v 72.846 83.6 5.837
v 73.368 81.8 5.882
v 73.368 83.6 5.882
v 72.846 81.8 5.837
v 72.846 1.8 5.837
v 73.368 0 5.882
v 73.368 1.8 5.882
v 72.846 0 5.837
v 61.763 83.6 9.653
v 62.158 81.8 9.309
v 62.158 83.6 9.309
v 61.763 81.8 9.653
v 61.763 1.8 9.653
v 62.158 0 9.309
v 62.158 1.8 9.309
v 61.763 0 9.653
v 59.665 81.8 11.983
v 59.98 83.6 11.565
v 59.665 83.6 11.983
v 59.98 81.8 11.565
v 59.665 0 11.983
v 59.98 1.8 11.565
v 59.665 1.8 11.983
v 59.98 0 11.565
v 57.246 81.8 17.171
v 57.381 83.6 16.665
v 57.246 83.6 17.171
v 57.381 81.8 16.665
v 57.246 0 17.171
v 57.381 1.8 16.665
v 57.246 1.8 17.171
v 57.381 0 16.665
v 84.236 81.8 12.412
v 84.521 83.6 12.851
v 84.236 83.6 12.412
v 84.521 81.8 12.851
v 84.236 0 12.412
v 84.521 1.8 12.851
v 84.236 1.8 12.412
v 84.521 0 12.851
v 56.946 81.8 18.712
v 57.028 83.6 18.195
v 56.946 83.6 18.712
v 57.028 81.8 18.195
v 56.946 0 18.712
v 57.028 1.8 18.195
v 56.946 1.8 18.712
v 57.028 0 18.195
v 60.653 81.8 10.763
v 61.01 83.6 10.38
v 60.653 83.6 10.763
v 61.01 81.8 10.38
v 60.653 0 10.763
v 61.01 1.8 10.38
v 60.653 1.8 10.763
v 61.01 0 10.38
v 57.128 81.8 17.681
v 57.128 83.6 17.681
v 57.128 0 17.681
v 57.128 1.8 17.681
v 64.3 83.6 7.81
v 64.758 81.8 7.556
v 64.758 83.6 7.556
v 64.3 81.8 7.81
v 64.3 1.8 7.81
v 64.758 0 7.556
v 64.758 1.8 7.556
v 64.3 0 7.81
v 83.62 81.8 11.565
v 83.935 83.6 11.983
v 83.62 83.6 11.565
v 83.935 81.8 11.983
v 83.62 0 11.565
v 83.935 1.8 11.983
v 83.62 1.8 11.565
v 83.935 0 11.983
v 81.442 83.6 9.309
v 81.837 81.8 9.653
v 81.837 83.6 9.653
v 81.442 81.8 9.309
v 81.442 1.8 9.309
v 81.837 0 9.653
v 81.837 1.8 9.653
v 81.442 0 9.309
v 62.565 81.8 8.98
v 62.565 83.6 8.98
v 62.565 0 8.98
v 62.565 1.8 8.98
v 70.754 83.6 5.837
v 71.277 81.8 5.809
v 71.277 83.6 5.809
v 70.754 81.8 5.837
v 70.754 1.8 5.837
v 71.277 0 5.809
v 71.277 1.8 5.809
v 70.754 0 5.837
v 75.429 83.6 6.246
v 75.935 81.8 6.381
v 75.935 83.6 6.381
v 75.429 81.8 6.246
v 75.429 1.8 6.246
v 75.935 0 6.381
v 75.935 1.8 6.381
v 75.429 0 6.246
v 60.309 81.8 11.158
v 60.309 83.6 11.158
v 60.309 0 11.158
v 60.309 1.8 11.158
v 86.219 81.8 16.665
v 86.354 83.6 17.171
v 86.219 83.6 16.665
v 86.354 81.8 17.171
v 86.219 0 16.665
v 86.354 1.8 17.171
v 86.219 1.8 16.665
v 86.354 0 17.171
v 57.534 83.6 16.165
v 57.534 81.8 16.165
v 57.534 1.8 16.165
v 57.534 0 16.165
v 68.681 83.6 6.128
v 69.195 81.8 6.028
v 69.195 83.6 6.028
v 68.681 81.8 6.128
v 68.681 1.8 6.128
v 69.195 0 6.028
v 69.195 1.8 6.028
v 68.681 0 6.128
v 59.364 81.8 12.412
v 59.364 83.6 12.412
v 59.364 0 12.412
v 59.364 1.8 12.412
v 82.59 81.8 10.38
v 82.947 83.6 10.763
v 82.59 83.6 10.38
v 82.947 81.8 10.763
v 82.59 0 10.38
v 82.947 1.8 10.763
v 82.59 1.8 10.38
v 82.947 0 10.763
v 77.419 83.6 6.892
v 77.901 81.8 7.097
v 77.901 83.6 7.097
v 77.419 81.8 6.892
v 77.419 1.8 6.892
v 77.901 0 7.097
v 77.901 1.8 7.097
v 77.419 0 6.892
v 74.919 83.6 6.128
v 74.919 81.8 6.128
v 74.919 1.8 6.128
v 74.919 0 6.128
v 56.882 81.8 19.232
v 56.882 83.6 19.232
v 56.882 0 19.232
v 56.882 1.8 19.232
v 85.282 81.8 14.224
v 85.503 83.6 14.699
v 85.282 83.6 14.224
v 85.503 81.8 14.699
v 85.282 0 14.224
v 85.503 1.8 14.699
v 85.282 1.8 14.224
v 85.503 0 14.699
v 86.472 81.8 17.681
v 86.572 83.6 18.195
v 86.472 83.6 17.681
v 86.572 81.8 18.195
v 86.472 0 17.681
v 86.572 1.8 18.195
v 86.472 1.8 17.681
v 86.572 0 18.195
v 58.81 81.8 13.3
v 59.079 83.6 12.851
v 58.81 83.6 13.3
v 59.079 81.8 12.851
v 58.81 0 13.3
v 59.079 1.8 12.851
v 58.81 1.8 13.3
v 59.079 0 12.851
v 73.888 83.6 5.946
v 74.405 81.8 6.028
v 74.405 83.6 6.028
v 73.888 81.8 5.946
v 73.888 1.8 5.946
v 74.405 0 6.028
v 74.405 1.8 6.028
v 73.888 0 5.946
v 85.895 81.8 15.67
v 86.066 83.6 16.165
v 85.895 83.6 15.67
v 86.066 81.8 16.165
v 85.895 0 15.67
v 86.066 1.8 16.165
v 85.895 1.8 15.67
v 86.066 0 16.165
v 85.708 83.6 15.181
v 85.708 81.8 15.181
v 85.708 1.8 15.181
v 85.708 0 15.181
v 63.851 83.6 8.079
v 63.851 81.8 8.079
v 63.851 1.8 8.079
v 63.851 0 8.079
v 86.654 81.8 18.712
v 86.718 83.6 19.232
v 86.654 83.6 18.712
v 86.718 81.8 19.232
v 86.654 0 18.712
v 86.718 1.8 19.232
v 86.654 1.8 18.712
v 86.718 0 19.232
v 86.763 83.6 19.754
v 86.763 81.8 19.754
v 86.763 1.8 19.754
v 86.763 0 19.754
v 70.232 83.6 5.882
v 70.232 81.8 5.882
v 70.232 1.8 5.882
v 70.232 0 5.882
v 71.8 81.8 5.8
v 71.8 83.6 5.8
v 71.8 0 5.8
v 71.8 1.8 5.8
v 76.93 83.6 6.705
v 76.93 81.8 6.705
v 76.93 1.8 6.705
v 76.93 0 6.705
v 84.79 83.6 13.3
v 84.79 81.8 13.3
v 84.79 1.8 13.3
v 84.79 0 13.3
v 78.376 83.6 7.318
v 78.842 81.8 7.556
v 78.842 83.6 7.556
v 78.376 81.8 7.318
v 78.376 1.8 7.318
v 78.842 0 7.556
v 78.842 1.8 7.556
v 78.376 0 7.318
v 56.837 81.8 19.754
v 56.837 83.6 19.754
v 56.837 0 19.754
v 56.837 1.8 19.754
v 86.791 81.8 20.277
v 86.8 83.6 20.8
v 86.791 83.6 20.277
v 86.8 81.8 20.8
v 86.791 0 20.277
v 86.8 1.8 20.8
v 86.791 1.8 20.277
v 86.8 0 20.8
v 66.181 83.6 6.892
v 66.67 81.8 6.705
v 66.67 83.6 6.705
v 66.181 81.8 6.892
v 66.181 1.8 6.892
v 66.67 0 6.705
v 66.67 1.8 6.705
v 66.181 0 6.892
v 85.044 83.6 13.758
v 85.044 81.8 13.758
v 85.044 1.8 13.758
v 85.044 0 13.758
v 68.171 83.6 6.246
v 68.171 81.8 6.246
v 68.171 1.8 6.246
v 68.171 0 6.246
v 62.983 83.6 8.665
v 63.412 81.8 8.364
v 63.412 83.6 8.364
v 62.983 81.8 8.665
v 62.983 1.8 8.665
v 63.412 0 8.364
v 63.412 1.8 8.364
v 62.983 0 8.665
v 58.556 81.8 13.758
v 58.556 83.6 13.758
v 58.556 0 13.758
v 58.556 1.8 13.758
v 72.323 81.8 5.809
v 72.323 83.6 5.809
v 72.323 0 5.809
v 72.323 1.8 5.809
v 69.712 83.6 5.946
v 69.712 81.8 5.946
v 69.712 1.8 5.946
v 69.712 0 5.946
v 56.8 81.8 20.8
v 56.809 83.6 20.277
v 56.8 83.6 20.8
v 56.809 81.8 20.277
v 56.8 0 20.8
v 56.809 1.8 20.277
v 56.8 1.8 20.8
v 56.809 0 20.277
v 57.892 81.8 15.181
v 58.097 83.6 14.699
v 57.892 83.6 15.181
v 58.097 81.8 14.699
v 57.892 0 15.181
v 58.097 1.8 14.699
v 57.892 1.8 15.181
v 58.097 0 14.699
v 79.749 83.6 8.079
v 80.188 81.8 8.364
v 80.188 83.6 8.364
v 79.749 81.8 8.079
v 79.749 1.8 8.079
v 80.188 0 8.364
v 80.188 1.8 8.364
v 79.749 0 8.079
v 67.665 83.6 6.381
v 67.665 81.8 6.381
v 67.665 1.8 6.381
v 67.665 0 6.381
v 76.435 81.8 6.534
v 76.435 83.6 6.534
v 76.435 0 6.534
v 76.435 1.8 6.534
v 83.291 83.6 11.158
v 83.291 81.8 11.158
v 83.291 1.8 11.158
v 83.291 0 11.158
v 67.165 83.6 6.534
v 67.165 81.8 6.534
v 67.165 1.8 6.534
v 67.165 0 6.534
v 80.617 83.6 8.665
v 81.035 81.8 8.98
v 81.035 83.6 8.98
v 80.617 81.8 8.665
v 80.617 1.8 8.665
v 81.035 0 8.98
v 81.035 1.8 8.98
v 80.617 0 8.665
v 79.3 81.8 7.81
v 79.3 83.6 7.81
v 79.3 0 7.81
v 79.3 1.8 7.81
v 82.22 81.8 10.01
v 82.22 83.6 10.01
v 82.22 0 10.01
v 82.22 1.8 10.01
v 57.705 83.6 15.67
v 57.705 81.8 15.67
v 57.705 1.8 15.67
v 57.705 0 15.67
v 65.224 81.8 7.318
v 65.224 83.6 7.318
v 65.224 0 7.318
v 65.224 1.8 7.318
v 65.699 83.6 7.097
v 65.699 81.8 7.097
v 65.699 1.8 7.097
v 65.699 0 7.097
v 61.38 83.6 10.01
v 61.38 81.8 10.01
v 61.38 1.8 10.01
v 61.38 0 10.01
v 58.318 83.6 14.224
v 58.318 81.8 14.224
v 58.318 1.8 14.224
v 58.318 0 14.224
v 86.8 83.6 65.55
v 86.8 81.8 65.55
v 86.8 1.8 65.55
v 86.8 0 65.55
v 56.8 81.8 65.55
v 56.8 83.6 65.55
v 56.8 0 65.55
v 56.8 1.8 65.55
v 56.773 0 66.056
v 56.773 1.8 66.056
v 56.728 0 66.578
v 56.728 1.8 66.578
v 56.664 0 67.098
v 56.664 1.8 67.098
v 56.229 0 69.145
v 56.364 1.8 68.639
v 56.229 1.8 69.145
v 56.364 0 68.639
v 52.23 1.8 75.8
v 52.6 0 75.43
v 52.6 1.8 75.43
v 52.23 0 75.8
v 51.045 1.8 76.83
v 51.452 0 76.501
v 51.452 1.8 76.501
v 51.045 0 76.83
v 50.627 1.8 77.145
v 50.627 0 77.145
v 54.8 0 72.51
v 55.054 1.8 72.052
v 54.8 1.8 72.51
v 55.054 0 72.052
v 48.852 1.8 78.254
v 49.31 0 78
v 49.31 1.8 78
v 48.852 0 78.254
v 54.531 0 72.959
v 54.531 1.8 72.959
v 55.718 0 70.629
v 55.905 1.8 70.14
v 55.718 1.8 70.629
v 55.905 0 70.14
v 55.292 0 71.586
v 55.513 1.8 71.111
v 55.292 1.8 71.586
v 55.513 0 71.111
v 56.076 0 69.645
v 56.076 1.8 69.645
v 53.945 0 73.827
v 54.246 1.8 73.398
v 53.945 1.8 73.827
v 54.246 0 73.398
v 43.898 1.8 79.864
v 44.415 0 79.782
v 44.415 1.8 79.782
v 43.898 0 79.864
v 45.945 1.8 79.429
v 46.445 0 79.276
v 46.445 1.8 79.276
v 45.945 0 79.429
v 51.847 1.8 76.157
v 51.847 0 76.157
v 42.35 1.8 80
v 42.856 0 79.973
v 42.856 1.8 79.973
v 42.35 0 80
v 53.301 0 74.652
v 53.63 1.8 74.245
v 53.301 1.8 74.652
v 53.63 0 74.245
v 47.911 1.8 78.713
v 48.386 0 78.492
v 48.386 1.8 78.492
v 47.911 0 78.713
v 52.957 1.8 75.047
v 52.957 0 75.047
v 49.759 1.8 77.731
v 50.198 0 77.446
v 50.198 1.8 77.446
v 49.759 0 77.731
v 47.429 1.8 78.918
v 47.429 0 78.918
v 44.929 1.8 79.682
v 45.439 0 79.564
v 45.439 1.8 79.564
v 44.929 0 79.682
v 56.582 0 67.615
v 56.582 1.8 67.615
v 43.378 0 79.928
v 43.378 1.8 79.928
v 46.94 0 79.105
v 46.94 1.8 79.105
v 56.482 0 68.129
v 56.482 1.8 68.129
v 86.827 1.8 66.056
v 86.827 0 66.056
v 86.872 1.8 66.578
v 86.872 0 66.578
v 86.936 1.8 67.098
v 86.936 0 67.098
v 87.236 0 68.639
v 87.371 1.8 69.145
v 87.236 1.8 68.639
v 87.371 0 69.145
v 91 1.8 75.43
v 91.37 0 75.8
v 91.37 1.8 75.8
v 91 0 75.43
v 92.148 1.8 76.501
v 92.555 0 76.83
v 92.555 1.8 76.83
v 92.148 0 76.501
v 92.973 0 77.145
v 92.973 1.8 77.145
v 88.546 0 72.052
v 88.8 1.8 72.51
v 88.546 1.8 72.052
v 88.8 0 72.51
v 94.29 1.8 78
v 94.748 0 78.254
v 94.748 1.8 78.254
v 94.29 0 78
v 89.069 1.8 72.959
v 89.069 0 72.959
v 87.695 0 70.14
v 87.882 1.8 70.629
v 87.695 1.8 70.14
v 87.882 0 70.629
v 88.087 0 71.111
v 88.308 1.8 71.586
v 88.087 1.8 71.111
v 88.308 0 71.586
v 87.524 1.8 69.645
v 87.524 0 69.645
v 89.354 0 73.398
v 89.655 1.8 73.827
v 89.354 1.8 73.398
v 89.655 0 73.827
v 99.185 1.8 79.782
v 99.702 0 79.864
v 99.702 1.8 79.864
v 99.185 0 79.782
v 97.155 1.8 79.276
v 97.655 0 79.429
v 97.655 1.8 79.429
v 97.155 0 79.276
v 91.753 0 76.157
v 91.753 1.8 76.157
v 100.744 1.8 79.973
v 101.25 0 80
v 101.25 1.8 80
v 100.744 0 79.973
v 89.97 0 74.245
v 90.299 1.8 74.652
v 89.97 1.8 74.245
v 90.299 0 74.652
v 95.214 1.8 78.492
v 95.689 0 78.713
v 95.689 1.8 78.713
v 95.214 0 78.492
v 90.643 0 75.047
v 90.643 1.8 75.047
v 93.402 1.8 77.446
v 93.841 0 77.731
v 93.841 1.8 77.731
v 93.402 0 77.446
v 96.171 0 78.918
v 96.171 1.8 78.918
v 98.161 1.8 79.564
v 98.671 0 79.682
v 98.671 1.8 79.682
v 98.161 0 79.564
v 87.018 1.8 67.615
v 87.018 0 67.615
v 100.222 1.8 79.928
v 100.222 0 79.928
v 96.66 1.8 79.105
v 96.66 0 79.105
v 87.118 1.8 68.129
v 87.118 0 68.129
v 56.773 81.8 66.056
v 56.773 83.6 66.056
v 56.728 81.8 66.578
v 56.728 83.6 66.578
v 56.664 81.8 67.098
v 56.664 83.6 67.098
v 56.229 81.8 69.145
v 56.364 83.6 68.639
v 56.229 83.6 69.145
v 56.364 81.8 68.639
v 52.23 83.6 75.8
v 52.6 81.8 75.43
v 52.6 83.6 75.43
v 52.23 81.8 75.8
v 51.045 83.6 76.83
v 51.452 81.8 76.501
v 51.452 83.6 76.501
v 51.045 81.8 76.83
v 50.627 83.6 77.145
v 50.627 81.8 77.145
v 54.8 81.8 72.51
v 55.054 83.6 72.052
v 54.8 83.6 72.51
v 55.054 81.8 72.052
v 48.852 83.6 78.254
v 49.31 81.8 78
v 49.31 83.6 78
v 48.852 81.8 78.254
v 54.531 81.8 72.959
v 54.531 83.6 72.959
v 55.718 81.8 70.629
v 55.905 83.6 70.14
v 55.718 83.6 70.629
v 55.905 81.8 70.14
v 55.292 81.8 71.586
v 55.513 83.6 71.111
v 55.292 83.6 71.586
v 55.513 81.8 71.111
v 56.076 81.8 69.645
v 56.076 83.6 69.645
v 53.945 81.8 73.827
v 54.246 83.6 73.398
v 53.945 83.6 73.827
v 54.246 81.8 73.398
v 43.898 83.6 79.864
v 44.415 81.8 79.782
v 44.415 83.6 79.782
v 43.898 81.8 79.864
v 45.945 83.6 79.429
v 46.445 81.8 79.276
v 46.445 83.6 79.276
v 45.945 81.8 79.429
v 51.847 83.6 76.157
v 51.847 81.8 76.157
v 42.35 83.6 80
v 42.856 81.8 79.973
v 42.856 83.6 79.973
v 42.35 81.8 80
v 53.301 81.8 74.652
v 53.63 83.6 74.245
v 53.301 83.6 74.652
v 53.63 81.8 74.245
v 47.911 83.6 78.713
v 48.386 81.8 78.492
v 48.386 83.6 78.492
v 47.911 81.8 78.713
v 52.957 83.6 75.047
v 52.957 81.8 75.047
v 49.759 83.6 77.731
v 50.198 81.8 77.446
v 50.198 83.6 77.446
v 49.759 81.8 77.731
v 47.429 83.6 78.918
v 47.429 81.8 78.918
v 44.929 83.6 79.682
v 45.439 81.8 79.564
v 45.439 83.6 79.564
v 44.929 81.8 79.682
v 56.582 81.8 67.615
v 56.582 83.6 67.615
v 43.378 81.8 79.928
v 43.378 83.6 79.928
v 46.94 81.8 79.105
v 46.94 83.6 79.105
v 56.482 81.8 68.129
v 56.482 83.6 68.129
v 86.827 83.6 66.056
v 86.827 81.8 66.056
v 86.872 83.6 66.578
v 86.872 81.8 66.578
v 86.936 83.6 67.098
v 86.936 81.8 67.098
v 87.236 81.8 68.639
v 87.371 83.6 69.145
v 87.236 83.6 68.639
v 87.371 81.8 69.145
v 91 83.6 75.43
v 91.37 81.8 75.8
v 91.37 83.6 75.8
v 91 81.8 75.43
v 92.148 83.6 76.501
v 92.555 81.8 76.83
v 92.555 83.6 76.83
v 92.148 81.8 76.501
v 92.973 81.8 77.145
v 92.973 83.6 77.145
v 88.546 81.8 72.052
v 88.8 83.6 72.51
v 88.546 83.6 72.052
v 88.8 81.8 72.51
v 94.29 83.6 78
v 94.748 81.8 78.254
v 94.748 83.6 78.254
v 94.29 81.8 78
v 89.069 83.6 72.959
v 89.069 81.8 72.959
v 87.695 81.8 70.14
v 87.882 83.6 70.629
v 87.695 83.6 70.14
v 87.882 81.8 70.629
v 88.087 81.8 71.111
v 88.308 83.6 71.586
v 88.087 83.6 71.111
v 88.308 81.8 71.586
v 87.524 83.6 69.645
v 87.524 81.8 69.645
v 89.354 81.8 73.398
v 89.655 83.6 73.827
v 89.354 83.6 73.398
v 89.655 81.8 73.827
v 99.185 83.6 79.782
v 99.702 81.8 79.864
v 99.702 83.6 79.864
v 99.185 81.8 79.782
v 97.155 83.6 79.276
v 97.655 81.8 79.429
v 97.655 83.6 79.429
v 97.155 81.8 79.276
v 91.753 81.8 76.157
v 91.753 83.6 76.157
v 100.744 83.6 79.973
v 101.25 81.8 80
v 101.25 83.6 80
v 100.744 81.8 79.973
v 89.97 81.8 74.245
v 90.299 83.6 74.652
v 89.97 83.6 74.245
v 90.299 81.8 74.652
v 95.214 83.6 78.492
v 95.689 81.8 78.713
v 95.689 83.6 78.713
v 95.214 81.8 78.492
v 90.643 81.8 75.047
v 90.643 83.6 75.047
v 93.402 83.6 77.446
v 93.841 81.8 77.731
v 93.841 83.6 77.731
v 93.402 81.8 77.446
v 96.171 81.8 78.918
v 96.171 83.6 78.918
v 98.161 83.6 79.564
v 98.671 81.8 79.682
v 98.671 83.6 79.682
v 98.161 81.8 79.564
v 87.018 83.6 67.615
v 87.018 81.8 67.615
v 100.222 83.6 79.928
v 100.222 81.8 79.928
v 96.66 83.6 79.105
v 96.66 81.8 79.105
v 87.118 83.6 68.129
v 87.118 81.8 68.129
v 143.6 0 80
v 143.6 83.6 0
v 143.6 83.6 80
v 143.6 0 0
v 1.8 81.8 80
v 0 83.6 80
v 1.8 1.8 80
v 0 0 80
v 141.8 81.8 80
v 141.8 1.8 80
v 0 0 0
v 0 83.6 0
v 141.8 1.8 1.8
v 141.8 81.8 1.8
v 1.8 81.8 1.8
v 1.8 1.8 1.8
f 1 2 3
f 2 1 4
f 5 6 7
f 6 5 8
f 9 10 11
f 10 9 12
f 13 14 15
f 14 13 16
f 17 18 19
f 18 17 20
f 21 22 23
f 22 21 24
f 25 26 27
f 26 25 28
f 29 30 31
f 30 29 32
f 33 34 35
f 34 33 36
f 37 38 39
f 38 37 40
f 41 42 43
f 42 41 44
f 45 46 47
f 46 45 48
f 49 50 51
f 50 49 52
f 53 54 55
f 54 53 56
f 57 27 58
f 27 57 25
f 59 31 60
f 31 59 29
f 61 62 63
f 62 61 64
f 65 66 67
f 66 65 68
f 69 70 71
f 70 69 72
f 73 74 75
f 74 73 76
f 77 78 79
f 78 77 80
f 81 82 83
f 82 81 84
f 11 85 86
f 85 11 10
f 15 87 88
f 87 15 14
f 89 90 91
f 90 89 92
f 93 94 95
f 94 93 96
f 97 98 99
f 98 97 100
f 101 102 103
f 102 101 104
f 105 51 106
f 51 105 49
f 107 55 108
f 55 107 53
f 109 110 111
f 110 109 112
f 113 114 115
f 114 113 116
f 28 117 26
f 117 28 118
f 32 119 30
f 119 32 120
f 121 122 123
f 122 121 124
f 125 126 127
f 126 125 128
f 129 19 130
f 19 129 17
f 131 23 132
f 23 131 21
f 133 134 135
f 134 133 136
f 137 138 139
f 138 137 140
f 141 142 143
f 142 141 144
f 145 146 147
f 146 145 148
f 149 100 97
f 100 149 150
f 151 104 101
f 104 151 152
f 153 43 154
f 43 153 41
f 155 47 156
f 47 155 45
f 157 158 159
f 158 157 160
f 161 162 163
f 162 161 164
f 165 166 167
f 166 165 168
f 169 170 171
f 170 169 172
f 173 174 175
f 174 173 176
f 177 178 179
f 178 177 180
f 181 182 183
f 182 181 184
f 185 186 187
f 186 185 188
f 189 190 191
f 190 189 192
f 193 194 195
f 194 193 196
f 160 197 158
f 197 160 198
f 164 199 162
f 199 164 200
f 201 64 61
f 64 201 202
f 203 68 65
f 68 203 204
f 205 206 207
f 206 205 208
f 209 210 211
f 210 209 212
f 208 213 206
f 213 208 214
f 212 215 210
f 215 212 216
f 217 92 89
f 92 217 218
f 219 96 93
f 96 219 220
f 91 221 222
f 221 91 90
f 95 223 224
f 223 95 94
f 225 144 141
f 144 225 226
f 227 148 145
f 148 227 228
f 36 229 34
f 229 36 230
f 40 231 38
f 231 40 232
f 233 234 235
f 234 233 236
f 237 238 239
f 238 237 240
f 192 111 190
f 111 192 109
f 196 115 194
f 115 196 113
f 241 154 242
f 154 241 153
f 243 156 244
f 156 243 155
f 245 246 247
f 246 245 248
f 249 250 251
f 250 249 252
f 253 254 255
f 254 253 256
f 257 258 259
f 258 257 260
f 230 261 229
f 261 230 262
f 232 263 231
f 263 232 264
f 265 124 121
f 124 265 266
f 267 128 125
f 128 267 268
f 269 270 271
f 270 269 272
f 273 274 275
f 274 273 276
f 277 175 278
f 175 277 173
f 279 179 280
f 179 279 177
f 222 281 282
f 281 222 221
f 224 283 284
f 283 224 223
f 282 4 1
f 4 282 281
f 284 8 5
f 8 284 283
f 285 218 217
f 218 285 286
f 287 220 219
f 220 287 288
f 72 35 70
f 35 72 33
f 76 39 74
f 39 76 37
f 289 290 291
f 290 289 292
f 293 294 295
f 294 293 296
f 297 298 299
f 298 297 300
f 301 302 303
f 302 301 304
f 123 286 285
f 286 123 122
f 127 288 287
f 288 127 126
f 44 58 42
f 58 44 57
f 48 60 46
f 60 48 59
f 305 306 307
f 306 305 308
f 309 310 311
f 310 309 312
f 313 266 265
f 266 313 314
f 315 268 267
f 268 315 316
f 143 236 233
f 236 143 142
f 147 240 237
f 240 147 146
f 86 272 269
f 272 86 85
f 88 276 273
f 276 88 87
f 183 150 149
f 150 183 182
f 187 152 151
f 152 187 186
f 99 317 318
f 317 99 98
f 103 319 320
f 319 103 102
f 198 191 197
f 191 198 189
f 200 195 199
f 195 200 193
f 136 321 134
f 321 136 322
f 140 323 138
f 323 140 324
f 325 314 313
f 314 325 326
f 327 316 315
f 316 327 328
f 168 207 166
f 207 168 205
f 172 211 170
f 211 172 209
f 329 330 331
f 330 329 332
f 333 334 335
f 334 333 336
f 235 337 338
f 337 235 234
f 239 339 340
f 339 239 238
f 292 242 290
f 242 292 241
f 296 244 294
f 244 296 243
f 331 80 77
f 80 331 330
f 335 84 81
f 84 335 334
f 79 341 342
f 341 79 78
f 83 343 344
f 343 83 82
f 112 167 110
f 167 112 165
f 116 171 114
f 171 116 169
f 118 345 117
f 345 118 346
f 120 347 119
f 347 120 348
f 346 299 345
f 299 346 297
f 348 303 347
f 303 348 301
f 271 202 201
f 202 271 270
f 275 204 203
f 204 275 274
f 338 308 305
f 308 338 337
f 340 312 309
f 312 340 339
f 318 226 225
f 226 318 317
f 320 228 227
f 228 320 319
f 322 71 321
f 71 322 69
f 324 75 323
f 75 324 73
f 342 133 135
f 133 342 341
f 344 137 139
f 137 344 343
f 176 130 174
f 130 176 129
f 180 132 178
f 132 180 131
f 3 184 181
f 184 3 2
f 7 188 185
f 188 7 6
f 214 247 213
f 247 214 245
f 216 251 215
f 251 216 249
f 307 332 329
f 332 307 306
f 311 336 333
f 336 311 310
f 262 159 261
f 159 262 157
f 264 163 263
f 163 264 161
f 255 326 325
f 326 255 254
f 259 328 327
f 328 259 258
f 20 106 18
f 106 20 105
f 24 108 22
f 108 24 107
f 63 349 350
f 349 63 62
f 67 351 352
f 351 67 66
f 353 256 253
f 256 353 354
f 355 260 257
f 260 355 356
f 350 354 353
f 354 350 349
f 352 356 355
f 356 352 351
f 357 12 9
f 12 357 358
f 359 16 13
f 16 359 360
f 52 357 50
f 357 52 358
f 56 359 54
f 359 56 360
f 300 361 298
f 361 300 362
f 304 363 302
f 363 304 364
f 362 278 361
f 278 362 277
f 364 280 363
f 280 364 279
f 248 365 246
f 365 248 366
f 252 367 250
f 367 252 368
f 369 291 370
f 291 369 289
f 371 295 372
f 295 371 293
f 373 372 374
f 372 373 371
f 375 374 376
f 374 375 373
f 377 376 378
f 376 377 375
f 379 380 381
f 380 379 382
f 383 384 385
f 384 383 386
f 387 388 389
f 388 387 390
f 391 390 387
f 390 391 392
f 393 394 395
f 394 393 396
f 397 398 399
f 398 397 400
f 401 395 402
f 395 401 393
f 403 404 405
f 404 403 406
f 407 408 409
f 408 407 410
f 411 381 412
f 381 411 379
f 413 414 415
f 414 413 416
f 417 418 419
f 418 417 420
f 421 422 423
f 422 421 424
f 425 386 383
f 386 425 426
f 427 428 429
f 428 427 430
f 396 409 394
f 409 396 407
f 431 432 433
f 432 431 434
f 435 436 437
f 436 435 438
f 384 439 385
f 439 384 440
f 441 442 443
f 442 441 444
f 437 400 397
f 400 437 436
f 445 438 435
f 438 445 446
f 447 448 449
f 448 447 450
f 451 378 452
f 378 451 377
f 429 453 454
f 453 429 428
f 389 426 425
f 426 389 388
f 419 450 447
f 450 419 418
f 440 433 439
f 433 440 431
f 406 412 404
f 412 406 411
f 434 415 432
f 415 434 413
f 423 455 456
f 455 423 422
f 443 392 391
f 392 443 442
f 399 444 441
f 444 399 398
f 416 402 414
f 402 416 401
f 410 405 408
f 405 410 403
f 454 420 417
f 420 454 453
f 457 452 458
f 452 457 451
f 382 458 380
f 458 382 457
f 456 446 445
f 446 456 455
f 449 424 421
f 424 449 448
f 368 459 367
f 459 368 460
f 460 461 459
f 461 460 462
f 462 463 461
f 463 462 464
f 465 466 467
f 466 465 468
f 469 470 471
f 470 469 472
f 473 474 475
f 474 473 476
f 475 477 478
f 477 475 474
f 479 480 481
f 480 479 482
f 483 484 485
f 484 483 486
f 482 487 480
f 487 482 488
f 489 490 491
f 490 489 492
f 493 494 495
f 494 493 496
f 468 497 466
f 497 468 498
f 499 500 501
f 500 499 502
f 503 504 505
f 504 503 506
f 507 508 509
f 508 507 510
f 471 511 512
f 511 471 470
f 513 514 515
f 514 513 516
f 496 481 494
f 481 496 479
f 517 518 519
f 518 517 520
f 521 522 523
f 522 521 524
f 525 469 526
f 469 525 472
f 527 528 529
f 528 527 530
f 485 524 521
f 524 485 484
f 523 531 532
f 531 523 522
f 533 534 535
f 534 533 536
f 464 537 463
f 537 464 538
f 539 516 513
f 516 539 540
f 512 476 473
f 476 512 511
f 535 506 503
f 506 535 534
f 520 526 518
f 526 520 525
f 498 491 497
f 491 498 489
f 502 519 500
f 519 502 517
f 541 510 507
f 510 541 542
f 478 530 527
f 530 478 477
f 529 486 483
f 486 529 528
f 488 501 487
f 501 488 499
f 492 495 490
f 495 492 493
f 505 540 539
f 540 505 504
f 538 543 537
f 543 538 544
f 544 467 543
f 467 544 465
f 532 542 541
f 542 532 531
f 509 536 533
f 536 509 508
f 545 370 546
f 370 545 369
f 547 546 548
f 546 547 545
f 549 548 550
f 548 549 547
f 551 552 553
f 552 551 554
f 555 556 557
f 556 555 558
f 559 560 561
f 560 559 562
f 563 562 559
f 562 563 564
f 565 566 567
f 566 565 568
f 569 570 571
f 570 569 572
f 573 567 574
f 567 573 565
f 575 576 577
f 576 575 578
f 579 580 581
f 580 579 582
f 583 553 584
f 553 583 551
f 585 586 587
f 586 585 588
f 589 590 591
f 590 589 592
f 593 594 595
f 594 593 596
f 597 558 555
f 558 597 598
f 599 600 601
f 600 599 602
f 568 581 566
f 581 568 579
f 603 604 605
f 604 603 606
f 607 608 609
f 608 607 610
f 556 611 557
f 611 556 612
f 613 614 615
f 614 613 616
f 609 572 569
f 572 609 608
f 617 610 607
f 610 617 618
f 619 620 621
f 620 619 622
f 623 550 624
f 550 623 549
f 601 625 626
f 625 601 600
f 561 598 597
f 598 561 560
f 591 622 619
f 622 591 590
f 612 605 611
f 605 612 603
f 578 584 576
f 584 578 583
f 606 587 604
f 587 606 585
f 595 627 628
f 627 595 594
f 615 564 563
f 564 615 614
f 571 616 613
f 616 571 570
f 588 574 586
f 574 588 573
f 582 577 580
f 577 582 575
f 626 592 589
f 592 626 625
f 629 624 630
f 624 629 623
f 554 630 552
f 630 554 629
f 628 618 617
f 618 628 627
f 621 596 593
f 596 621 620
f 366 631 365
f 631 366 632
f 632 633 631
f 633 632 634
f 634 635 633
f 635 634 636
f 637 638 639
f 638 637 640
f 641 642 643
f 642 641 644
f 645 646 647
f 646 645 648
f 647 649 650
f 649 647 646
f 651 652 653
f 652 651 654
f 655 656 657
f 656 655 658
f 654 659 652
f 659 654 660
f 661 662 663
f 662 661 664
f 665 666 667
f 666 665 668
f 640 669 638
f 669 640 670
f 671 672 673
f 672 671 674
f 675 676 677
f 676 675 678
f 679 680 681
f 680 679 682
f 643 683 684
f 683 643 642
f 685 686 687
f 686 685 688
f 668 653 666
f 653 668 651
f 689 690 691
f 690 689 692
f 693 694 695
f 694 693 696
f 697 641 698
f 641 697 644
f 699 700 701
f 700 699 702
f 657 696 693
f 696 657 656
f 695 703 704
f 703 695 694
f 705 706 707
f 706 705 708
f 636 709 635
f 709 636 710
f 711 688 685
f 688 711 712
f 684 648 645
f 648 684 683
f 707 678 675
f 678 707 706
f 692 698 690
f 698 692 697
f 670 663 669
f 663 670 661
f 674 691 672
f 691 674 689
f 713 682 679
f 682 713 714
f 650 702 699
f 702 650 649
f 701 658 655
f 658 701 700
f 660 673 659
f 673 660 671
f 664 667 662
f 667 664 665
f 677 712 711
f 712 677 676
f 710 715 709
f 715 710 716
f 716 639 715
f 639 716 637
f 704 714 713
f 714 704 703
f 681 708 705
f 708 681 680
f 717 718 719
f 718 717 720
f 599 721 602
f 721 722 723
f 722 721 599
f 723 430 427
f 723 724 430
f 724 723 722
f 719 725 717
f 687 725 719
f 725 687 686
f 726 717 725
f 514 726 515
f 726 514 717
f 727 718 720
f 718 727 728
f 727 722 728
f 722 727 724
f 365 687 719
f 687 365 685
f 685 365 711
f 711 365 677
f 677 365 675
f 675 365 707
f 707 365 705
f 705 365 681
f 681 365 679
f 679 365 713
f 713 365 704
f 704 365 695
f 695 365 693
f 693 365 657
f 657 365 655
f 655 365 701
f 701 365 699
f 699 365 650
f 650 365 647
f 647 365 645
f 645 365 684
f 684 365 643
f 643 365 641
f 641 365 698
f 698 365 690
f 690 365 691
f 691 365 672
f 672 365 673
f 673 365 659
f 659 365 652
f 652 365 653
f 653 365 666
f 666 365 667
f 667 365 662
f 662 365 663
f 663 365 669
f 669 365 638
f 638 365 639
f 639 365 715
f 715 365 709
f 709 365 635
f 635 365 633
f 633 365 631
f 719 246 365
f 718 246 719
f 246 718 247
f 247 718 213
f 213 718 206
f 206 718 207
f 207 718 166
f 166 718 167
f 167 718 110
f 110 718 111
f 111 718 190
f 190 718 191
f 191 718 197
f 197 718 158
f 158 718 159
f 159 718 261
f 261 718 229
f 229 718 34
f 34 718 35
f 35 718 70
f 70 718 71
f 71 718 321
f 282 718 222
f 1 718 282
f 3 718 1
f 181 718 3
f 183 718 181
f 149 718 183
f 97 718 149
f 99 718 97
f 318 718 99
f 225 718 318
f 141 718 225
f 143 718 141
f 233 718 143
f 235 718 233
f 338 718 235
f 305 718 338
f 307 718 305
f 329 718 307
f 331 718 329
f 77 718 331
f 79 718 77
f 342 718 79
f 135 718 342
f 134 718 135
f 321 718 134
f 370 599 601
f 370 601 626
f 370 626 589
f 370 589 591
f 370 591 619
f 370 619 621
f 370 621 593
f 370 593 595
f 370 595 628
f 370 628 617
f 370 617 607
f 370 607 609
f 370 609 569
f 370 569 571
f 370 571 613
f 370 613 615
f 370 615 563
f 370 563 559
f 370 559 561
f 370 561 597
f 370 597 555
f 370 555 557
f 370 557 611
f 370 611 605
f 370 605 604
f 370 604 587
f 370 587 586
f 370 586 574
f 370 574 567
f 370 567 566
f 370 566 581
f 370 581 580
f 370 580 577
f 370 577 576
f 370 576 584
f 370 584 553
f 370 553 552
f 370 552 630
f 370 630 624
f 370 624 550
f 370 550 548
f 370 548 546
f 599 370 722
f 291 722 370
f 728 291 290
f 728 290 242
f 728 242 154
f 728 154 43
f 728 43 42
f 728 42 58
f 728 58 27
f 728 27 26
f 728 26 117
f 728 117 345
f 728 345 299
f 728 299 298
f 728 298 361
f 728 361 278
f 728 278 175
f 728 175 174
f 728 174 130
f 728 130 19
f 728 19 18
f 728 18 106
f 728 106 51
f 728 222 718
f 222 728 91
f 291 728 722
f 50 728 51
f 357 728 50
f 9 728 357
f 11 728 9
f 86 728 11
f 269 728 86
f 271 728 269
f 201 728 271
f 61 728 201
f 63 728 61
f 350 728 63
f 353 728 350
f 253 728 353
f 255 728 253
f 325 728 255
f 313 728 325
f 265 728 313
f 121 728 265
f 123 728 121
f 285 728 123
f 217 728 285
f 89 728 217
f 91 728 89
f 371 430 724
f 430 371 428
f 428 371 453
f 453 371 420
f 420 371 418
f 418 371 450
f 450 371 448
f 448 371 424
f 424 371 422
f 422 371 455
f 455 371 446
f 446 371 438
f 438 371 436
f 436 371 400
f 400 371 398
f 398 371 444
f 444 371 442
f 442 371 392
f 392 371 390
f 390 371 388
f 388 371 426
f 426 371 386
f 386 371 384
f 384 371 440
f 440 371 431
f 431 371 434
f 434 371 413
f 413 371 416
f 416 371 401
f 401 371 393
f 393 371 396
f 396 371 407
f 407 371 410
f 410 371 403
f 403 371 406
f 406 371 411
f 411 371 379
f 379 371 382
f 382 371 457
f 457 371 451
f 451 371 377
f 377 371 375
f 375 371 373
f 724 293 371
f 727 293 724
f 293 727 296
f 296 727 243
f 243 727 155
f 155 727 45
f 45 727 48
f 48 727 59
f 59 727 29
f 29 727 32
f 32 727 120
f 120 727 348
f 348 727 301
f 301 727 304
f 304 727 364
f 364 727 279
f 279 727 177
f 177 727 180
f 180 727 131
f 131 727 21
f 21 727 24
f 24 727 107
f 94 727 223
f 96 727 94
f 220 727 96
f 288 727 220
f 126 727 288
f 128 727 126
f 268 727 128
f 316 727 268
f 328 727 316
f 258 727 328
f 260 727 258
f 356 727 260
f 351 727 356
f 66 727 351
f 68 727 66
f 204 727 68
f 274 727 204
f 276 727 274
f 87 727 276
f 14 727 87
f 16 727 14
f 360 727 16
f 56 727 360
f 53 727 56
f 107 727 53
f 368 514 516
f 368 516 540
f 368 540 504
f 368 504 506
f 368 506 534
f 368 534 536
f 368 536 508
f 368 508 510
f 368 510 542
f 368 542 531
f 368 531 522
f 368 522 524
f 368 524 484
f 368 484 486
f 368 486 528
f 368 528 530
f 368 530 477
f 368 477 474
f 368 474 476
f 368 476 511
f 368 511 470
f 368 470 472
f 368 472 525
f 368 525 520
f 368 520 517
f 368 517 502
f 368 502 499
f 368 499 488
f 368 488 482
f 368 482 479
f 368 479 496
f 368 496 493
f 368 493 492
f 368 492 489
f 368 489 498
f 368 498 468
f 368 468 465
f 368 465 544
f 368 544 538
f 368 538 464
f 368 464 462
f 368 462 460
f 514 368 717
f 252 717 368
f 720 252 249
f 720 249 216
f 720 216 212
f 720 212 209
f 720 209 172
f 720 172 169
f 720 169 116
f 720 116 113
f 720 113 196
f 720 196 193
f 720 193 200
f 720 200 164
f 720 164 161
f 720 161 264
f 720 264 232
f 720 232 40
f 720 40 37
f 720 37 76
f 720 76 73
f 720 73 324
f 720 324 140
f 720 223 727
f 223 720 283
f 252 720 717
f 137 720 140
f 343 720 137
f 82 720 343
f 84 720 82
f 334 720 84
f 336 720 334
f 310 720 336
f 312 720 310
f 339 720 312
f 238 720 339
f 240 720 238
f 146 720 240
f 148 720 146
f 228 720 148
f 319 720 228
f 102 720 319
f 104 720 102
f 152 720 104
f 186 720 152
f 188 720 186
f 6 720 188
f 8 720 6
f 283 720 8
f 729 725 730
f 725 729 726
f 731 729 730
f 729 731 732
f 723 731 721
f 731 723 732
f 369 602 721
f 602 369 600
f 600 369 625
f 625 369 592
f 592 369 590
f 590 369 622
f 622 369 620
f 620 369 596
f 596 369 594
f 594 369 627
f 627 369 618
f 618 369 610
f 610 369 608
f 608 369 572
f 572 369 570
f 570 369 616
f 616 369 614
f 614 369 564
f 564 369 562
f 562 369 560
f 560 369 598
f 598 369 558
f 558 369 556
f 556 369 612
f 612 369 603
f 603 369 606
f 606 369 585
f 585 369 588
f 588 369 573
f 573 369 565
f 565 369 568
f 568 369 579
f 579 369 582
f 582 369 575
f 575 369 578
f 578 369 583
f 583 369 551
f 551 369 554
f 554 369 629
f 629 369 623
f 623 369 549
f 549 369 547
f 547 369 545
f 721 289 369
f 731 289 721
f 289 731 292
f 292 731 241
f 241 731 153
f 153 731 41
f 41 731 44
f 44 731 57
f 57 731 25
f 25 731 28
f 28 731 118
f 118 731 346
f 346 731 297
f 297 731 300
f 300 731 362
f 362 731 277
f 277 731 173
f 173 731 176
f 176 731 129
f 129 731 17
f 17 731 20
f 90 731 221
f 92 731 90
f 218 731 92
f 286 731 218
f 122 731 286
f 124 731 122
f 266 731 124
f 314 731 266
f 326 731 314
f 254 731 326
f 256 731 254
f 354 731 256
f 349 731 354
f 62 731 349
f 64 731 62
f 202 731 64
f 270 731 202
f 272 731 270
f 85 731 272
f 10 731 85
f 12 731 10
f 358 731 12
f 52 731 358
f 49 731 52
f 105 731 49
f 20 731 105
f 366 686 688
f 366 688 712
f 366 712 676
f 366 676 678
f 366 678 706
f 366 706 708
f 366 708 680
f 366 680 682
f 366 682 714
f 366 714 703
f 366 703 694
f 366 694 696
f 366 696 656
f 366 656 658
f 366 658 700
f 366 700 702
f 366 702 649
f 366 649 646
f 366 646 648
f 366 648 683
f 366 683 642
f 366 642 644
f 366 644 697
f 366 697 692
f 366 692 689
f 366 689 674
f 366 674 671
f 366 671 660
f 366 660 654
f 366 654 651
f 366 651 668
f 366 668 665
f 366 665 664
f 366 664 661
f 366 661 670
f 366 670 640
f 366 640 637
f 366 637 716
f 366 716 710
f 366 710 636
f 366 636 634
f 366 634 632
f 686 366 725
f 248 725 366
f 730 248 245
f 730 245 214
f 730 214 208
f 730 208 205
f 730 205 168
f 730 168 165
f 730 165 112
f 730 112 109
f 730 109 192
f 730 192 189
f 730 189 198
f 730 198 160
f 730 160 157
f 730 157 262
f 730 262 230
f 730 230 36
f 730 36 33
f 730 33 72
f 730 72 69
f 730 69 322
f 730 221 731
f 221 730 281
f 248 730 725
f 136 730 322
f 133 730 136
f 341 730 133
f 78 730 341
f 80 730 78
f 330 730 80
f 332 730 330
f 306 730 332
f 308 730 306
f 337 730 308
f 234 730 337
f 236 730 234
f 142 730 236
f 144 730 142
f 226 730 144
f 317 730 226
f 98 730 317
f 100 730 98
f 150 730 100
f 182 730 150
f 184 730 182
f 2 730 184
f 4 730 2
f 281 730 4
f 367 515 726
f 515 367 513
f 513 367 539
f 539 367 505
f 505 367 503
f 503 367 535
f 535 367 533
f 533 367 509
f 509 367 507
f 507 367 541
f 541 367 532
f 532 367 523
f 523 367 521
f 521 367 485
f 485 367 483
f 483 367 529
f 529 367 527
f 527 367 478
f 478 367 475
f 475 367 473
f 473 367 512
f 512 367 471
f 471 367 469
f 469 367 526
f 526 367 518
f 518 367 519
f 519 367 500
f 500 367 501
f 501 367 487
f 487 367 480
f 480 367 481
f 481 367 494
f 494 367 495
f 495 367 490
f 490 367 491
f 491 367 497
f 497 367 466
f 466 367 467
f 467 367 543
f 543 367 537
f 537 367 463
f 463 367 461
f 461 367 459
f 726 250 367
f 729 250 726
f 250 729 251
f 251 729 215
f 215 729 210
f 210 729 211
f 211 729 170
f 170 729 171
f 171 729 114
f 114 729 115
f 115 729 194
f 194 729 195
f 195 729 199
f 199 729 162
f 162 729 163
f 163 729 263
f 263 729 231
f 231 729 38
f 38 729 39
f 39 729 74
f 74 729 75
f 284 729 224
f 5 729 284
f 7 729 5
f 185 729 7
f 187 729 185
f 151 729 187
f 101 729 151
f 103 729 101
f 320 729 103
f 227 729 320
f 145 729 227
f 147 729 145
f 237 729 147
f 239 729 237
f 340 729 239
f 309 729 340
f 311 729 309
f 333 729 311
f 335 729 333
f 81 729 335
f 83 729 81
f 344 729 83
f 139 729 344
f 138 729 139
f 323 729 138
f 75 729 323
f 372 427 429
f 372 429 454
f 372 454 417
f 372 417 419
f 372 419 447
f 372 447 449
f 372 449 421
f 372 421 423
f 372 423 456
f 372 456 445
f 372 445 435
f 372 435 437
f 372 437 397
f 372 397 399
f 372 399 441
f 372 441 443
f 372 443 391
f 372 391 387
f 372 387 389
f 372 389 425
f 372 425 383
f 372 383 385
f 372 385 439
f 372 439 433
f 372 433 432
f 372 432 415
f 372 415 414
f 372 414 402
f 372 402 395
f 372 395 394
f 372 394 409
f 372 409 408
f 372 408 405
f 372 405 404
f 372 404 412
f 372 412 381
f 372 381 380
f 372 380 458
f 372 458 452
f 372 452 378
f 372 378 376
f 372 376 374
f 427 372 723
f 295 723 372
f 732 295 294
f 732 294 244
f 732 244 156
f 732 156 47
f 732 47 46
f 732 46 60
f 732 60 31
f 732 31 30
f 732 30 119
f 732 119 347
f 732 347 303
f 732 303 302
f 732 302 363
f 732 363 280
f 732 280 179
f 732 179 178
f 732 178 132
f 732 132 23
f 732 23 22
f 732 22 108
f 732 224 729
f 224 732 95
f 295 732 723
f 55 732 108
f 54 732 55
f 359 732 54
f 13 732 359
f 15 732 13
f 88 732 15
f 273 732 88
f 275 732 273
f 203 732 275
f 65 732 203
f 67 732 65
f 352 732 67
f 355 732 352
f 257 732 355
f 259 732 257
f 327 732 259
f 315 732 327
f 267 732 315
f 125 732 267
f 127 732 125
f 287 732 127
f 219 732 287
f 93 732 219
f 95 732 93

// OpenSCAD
$fa = 2;    // minimum angle (fine resolution)
$fs = 0.4;  // minimum size (fine resolution)

external_height = 80;
internal_length = 140;
internal_width = 80;  // could go down to 60

thickness = 1.8; // good for 0.6mm nozzle

epsilon = 0.01;   // help avoid issues with floating-point rounding error
eps_vector = [epsilon, epsilon, epsilon];

external_length = internal_length + 2 * thickness;
external_width = internal_width + 2 * thickness;

module negative_quarter (r) {
  translate([0, thickness + epsilon, 0])
  rotate([90, 0, 0])
  difference () {
    cube([r, r, thickness + 2 * epsilon]);
    translate([0, 0, - epsilon])
      cylinder(r = r, h = thickness + 4 * epsilon);
  }
}

  radius = 15;
  midx = external_length / 2;

  module top_curve() {
    translate([midx - 2 * radius + epsilon, 0, external_height - radius + epsilon])
      negative_quarter(radius);
    translate([midx + 2 * radius - epsilon, 0, external_height - radius + epsilon])
      mirror([1, 0, 0])
      negative_quarter(radius);
  }


difference () {
  cube([external_length, external_width, external_height]);
  translate([thickness, thickness, thickness])
    cube([internal_length, internal_width, external_height - thickness + epsilon]);
  translate([midx, external_width + epsilon, radius + thickness + 4])
    rotate([90, 0, 0])
    union ( ) {
      cylinder(h=external_width + 2 * epsilon, r = radius);
      translate([-radius, 0, 0])
        cube([2 * radius, external_height, external_width + 2 * epsilon]);
    }
  top_curve();
  translate([0, external_width - thickness, 0]) top_curve();
  
}
